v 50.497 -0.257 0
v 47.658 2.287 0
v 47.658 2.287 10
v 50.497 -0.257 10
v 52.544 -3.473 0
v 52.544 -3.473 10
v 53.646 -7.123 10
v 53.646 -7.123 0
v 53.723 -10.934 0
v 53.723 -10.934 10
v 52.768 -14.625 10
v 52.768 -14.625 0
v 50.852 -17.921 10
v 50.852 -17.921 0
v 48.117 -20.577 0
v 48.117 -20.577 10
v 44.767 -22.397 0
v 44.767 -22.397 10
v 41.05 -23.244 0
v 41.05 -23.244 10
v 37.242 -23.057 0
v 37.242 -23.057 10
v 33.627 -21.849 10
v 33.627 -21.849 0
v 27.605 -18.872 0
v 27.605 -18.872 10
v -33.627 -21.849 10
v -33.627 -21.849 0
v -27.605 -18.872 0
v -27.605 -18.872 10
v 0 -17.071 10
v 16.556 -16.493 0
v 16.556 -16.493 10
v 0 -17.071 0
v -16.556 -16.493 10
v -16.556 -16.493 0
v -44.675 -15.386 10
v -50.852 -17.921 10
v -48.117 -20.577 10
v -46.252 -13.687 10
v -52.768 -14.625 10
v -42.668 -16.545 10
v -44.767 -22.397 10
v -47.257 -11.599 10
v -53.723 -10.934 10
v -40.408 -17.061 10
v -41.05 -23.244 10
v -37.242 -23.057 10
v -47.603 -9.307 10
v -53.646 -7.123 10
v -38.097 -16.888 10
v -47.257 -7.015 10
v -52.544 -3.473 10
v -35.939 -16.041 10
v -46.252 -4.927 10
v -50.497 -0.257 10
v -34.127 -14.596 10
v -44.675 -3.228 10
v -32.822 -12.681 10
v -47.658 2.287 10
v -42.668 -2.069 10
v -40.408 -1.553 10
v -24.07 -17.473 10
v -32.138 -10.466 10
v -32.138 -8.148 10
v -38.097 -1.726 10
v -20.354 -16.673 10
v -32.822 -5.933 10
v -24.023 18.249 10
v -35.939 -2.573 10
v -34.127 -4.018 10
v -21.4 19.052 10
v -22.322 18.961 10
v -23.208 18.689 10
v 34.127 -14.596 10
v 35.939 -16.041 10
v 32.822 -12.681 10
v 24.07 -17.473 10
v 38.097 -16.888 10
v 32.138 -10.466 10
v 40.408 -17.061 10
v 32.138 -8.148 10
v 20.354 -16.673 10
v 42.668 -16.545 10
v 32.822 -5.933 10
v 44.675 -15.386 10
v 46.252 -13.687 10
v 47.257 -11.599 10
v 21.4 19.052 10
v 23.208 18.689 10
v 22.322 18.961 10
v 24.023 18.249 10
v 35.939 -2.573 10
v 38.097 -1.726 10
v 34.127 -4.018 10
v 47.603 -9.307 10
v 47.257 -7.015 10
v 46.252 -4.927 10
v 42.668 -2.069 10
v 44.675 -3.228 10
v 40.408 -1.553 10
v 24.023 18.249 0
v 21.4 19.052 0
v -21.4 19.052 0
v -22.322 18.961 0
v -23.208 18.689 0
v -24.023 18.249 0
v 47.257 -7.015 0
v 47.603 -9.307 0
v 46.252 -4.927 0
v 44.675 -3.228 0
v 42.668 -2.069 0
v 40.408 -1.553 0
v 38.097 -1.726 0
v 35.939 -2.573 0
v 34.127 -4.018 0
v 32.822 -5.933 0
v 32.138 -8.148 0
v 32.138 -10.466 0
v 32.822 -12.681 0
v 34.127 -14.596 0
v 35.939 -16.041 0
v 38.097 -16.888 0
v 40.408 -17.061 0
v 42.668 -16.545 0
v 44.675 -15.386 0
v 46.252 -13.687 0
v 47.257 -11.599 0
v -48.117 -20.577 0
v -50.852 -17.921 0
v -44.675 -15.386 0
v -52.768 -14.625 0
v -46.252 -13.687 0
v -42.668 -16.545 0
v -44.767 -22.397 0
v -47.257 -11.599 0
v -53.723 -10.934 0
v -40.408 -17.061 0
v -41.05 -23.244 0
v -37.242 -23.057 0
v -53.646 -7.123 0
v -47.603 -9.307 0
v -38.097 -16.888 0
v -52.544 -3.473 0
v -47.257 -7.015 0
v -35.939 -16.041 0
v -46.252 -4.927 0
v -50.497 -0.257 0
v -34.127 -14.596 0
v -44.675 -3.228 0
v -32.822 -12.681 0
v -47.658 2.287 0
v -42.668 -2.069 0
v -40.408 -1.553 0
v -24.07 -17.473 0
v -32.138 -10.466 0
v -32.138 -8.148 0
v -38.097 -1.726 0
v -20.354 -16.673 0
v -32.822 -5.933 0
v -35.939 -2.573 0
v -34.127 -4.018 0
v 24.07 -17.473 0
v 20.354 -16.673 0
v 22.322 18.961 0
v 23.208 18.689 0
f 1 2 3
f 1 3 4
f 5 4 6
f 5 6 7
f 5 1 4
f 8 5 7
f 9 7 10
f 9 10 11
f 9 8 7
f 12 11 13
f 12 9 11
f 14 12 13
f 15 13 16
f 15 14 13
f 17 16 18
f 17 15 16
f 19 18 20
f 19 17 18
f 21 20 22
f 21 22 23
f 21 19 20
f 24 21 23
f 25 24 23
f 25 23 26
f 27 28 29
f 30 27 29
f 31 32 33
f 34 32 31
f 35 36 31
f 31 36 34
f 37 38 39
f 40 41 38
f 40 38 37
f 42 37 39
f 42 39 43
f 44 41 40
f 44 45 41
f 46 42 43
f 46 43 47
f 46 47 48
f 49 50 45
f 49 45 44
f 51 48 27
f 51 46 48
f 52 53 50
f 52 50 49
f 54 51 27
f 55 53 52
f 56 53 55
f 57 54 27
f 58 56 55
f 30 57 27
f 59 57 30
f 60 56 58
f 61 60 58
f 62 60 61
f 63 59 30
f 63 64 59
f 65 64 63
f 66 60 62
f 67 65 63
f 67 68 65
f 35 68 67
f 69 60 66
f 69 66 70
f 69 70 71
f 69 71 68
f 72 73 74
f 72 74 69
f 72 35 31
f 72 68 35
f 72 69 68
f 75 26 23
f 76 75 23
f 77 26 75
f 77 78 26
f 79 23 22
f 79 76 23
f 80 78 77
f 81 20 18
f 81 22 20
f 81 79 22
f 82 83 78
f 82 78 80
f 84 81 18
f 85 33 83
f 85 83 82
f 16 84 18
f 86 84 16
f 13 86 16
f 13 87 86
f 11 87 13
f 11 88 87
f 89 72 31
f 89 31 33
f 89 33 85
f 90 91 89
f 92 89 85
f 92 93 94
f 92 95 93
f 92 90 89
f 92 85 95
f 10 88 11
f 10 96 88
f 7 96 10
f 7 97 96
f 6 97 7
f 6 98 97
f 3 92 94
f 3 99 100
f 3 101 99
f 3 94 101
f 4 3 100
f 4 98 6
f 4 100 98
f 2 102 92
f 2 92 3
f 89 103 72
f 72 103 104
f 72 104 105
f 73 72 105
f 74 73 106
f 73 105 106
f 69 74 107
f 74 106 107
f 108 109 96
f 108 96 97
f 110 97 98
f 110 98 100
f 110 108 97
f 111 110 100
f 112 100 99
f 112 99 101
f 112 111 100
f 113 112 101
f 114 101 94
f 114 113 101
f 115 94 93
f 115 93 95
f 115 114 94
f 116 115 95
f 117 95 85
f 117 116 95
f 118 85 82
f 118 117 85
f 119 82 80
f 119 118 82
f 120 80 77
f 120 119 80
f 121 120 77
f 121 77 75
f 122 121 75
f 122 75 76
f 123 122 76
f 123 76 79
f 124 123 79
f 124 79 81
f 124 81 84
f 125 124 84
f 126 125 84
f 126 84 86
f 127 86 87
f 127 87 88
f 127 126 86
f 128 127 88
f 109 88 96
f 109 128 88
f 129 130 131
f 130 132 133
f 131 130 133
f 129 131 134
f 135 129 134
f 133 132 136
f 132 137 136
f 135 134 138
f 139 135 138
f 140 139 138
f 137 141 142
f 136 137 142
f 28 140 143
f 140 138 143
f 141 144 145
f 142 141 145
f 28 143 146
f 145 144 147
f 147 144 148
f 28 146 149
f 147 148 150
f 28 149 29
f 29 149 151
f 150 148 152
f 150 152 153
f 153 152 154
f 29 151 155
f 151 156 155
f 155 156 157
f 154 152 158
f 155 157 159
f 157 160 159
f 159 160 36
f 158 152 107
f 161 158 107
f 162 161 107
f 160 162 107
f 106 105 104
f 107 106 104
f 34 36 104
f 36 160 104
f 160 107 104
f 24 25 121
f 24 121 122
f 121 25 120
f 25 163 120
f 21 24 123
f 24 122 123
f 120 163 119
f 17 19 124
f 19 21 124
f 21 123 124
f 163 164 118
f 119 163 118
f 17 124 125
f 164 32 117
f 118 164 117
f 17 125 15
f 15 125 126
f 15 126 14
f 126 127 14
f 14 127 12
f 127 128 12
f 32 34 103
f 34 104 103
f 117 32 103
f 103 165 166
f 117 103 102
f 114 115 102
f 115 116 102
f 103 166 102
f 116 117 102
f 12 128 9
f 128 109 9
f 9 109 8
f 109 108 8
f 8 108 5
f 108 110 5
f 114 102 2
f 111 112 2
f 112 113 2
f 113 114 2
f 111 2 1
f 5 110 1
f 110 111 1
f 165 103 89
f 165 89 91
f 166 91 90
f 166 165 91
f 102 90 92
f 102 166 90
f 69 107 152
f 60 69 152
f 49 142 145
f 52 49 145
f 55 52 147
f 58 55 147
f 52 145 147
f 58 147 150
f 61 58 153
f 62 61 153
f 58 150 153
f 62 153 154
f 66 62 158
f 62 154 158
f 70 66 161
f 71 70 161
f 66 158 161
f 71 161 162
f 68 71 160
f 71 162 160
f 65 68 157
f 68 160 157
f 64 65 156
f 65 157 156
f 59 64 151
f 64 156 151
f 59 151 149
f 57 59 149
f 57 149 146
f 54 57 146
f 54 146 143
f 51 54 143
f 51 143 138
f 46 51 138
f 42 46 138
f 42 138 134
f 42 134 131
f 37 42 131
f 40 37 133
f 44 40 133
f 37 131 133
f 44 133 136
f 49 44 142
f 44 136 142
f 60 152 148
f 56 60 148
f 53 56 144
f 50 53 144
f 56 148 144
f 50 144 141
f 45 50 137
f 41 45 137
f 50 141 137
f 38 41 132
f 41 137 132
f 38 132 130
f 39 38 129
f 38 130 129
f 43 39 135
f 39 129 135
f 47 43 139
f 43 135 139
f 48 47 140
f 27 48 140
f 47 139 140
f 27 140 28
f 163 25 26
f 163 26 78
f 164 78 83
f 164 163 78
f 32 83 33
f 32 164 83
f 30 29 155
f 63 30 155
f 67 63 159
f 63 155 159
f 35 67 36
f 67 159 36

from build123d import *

# Parameters (mm, degrees)
SKETCH1_R           = 7.775663032
BOSS_EXTRUDE1_DEPTH = 10


with BuildPart() as part:
    # Sketch1 → Boss-Extrude1 (new body)
    with BuildSketch(Plane.XY):
        with BuildLine():
            Line((0, 19.052140157), (21.399532491, 19.052140157))
            ThreePointArc((21.399532491, 19.052140157), (22.771528747, 18.846885641), (24.023387185, 18.249095047))
            Line((24.023387185, 18.249095047), (47.657624277, 2.287166265))
            ThreePointArc((47.657624277, 2.287166265), (51.92269033, -16.338565843), (33.626657752, -21.848908566))
            Line((33.626657752, -21.848908566), (27.605393149, -18.872072273))
            ThreePointArc((27.605393149, -18.872072273), (22.228507675, -16.996447441), (16.556211898, -16.492536209))
            Line((16.556211898, -16.492536209), (0, -17.070741143))
            Line((0, -17.070741143), (0, 0))
            Line((0, 0), (0, 19.052140157))
        make_face()
        with Locations((39.827165888, -9.307103614)):
            Circle(SKETCH1_R, mode=Mode.SUBTRACT)
    boss_extrude1 = extrude(amount=BOSS_EXTRUDE1_DEPTH)

    # Mirror1: Boss-Extrude1 across plane
    add(boss_extrude1.mirror(Plane(origin=(0, 0, 10), x_dir=(0, 0, 1), z_dir=(1, 0, 0))))


solid = part.part
